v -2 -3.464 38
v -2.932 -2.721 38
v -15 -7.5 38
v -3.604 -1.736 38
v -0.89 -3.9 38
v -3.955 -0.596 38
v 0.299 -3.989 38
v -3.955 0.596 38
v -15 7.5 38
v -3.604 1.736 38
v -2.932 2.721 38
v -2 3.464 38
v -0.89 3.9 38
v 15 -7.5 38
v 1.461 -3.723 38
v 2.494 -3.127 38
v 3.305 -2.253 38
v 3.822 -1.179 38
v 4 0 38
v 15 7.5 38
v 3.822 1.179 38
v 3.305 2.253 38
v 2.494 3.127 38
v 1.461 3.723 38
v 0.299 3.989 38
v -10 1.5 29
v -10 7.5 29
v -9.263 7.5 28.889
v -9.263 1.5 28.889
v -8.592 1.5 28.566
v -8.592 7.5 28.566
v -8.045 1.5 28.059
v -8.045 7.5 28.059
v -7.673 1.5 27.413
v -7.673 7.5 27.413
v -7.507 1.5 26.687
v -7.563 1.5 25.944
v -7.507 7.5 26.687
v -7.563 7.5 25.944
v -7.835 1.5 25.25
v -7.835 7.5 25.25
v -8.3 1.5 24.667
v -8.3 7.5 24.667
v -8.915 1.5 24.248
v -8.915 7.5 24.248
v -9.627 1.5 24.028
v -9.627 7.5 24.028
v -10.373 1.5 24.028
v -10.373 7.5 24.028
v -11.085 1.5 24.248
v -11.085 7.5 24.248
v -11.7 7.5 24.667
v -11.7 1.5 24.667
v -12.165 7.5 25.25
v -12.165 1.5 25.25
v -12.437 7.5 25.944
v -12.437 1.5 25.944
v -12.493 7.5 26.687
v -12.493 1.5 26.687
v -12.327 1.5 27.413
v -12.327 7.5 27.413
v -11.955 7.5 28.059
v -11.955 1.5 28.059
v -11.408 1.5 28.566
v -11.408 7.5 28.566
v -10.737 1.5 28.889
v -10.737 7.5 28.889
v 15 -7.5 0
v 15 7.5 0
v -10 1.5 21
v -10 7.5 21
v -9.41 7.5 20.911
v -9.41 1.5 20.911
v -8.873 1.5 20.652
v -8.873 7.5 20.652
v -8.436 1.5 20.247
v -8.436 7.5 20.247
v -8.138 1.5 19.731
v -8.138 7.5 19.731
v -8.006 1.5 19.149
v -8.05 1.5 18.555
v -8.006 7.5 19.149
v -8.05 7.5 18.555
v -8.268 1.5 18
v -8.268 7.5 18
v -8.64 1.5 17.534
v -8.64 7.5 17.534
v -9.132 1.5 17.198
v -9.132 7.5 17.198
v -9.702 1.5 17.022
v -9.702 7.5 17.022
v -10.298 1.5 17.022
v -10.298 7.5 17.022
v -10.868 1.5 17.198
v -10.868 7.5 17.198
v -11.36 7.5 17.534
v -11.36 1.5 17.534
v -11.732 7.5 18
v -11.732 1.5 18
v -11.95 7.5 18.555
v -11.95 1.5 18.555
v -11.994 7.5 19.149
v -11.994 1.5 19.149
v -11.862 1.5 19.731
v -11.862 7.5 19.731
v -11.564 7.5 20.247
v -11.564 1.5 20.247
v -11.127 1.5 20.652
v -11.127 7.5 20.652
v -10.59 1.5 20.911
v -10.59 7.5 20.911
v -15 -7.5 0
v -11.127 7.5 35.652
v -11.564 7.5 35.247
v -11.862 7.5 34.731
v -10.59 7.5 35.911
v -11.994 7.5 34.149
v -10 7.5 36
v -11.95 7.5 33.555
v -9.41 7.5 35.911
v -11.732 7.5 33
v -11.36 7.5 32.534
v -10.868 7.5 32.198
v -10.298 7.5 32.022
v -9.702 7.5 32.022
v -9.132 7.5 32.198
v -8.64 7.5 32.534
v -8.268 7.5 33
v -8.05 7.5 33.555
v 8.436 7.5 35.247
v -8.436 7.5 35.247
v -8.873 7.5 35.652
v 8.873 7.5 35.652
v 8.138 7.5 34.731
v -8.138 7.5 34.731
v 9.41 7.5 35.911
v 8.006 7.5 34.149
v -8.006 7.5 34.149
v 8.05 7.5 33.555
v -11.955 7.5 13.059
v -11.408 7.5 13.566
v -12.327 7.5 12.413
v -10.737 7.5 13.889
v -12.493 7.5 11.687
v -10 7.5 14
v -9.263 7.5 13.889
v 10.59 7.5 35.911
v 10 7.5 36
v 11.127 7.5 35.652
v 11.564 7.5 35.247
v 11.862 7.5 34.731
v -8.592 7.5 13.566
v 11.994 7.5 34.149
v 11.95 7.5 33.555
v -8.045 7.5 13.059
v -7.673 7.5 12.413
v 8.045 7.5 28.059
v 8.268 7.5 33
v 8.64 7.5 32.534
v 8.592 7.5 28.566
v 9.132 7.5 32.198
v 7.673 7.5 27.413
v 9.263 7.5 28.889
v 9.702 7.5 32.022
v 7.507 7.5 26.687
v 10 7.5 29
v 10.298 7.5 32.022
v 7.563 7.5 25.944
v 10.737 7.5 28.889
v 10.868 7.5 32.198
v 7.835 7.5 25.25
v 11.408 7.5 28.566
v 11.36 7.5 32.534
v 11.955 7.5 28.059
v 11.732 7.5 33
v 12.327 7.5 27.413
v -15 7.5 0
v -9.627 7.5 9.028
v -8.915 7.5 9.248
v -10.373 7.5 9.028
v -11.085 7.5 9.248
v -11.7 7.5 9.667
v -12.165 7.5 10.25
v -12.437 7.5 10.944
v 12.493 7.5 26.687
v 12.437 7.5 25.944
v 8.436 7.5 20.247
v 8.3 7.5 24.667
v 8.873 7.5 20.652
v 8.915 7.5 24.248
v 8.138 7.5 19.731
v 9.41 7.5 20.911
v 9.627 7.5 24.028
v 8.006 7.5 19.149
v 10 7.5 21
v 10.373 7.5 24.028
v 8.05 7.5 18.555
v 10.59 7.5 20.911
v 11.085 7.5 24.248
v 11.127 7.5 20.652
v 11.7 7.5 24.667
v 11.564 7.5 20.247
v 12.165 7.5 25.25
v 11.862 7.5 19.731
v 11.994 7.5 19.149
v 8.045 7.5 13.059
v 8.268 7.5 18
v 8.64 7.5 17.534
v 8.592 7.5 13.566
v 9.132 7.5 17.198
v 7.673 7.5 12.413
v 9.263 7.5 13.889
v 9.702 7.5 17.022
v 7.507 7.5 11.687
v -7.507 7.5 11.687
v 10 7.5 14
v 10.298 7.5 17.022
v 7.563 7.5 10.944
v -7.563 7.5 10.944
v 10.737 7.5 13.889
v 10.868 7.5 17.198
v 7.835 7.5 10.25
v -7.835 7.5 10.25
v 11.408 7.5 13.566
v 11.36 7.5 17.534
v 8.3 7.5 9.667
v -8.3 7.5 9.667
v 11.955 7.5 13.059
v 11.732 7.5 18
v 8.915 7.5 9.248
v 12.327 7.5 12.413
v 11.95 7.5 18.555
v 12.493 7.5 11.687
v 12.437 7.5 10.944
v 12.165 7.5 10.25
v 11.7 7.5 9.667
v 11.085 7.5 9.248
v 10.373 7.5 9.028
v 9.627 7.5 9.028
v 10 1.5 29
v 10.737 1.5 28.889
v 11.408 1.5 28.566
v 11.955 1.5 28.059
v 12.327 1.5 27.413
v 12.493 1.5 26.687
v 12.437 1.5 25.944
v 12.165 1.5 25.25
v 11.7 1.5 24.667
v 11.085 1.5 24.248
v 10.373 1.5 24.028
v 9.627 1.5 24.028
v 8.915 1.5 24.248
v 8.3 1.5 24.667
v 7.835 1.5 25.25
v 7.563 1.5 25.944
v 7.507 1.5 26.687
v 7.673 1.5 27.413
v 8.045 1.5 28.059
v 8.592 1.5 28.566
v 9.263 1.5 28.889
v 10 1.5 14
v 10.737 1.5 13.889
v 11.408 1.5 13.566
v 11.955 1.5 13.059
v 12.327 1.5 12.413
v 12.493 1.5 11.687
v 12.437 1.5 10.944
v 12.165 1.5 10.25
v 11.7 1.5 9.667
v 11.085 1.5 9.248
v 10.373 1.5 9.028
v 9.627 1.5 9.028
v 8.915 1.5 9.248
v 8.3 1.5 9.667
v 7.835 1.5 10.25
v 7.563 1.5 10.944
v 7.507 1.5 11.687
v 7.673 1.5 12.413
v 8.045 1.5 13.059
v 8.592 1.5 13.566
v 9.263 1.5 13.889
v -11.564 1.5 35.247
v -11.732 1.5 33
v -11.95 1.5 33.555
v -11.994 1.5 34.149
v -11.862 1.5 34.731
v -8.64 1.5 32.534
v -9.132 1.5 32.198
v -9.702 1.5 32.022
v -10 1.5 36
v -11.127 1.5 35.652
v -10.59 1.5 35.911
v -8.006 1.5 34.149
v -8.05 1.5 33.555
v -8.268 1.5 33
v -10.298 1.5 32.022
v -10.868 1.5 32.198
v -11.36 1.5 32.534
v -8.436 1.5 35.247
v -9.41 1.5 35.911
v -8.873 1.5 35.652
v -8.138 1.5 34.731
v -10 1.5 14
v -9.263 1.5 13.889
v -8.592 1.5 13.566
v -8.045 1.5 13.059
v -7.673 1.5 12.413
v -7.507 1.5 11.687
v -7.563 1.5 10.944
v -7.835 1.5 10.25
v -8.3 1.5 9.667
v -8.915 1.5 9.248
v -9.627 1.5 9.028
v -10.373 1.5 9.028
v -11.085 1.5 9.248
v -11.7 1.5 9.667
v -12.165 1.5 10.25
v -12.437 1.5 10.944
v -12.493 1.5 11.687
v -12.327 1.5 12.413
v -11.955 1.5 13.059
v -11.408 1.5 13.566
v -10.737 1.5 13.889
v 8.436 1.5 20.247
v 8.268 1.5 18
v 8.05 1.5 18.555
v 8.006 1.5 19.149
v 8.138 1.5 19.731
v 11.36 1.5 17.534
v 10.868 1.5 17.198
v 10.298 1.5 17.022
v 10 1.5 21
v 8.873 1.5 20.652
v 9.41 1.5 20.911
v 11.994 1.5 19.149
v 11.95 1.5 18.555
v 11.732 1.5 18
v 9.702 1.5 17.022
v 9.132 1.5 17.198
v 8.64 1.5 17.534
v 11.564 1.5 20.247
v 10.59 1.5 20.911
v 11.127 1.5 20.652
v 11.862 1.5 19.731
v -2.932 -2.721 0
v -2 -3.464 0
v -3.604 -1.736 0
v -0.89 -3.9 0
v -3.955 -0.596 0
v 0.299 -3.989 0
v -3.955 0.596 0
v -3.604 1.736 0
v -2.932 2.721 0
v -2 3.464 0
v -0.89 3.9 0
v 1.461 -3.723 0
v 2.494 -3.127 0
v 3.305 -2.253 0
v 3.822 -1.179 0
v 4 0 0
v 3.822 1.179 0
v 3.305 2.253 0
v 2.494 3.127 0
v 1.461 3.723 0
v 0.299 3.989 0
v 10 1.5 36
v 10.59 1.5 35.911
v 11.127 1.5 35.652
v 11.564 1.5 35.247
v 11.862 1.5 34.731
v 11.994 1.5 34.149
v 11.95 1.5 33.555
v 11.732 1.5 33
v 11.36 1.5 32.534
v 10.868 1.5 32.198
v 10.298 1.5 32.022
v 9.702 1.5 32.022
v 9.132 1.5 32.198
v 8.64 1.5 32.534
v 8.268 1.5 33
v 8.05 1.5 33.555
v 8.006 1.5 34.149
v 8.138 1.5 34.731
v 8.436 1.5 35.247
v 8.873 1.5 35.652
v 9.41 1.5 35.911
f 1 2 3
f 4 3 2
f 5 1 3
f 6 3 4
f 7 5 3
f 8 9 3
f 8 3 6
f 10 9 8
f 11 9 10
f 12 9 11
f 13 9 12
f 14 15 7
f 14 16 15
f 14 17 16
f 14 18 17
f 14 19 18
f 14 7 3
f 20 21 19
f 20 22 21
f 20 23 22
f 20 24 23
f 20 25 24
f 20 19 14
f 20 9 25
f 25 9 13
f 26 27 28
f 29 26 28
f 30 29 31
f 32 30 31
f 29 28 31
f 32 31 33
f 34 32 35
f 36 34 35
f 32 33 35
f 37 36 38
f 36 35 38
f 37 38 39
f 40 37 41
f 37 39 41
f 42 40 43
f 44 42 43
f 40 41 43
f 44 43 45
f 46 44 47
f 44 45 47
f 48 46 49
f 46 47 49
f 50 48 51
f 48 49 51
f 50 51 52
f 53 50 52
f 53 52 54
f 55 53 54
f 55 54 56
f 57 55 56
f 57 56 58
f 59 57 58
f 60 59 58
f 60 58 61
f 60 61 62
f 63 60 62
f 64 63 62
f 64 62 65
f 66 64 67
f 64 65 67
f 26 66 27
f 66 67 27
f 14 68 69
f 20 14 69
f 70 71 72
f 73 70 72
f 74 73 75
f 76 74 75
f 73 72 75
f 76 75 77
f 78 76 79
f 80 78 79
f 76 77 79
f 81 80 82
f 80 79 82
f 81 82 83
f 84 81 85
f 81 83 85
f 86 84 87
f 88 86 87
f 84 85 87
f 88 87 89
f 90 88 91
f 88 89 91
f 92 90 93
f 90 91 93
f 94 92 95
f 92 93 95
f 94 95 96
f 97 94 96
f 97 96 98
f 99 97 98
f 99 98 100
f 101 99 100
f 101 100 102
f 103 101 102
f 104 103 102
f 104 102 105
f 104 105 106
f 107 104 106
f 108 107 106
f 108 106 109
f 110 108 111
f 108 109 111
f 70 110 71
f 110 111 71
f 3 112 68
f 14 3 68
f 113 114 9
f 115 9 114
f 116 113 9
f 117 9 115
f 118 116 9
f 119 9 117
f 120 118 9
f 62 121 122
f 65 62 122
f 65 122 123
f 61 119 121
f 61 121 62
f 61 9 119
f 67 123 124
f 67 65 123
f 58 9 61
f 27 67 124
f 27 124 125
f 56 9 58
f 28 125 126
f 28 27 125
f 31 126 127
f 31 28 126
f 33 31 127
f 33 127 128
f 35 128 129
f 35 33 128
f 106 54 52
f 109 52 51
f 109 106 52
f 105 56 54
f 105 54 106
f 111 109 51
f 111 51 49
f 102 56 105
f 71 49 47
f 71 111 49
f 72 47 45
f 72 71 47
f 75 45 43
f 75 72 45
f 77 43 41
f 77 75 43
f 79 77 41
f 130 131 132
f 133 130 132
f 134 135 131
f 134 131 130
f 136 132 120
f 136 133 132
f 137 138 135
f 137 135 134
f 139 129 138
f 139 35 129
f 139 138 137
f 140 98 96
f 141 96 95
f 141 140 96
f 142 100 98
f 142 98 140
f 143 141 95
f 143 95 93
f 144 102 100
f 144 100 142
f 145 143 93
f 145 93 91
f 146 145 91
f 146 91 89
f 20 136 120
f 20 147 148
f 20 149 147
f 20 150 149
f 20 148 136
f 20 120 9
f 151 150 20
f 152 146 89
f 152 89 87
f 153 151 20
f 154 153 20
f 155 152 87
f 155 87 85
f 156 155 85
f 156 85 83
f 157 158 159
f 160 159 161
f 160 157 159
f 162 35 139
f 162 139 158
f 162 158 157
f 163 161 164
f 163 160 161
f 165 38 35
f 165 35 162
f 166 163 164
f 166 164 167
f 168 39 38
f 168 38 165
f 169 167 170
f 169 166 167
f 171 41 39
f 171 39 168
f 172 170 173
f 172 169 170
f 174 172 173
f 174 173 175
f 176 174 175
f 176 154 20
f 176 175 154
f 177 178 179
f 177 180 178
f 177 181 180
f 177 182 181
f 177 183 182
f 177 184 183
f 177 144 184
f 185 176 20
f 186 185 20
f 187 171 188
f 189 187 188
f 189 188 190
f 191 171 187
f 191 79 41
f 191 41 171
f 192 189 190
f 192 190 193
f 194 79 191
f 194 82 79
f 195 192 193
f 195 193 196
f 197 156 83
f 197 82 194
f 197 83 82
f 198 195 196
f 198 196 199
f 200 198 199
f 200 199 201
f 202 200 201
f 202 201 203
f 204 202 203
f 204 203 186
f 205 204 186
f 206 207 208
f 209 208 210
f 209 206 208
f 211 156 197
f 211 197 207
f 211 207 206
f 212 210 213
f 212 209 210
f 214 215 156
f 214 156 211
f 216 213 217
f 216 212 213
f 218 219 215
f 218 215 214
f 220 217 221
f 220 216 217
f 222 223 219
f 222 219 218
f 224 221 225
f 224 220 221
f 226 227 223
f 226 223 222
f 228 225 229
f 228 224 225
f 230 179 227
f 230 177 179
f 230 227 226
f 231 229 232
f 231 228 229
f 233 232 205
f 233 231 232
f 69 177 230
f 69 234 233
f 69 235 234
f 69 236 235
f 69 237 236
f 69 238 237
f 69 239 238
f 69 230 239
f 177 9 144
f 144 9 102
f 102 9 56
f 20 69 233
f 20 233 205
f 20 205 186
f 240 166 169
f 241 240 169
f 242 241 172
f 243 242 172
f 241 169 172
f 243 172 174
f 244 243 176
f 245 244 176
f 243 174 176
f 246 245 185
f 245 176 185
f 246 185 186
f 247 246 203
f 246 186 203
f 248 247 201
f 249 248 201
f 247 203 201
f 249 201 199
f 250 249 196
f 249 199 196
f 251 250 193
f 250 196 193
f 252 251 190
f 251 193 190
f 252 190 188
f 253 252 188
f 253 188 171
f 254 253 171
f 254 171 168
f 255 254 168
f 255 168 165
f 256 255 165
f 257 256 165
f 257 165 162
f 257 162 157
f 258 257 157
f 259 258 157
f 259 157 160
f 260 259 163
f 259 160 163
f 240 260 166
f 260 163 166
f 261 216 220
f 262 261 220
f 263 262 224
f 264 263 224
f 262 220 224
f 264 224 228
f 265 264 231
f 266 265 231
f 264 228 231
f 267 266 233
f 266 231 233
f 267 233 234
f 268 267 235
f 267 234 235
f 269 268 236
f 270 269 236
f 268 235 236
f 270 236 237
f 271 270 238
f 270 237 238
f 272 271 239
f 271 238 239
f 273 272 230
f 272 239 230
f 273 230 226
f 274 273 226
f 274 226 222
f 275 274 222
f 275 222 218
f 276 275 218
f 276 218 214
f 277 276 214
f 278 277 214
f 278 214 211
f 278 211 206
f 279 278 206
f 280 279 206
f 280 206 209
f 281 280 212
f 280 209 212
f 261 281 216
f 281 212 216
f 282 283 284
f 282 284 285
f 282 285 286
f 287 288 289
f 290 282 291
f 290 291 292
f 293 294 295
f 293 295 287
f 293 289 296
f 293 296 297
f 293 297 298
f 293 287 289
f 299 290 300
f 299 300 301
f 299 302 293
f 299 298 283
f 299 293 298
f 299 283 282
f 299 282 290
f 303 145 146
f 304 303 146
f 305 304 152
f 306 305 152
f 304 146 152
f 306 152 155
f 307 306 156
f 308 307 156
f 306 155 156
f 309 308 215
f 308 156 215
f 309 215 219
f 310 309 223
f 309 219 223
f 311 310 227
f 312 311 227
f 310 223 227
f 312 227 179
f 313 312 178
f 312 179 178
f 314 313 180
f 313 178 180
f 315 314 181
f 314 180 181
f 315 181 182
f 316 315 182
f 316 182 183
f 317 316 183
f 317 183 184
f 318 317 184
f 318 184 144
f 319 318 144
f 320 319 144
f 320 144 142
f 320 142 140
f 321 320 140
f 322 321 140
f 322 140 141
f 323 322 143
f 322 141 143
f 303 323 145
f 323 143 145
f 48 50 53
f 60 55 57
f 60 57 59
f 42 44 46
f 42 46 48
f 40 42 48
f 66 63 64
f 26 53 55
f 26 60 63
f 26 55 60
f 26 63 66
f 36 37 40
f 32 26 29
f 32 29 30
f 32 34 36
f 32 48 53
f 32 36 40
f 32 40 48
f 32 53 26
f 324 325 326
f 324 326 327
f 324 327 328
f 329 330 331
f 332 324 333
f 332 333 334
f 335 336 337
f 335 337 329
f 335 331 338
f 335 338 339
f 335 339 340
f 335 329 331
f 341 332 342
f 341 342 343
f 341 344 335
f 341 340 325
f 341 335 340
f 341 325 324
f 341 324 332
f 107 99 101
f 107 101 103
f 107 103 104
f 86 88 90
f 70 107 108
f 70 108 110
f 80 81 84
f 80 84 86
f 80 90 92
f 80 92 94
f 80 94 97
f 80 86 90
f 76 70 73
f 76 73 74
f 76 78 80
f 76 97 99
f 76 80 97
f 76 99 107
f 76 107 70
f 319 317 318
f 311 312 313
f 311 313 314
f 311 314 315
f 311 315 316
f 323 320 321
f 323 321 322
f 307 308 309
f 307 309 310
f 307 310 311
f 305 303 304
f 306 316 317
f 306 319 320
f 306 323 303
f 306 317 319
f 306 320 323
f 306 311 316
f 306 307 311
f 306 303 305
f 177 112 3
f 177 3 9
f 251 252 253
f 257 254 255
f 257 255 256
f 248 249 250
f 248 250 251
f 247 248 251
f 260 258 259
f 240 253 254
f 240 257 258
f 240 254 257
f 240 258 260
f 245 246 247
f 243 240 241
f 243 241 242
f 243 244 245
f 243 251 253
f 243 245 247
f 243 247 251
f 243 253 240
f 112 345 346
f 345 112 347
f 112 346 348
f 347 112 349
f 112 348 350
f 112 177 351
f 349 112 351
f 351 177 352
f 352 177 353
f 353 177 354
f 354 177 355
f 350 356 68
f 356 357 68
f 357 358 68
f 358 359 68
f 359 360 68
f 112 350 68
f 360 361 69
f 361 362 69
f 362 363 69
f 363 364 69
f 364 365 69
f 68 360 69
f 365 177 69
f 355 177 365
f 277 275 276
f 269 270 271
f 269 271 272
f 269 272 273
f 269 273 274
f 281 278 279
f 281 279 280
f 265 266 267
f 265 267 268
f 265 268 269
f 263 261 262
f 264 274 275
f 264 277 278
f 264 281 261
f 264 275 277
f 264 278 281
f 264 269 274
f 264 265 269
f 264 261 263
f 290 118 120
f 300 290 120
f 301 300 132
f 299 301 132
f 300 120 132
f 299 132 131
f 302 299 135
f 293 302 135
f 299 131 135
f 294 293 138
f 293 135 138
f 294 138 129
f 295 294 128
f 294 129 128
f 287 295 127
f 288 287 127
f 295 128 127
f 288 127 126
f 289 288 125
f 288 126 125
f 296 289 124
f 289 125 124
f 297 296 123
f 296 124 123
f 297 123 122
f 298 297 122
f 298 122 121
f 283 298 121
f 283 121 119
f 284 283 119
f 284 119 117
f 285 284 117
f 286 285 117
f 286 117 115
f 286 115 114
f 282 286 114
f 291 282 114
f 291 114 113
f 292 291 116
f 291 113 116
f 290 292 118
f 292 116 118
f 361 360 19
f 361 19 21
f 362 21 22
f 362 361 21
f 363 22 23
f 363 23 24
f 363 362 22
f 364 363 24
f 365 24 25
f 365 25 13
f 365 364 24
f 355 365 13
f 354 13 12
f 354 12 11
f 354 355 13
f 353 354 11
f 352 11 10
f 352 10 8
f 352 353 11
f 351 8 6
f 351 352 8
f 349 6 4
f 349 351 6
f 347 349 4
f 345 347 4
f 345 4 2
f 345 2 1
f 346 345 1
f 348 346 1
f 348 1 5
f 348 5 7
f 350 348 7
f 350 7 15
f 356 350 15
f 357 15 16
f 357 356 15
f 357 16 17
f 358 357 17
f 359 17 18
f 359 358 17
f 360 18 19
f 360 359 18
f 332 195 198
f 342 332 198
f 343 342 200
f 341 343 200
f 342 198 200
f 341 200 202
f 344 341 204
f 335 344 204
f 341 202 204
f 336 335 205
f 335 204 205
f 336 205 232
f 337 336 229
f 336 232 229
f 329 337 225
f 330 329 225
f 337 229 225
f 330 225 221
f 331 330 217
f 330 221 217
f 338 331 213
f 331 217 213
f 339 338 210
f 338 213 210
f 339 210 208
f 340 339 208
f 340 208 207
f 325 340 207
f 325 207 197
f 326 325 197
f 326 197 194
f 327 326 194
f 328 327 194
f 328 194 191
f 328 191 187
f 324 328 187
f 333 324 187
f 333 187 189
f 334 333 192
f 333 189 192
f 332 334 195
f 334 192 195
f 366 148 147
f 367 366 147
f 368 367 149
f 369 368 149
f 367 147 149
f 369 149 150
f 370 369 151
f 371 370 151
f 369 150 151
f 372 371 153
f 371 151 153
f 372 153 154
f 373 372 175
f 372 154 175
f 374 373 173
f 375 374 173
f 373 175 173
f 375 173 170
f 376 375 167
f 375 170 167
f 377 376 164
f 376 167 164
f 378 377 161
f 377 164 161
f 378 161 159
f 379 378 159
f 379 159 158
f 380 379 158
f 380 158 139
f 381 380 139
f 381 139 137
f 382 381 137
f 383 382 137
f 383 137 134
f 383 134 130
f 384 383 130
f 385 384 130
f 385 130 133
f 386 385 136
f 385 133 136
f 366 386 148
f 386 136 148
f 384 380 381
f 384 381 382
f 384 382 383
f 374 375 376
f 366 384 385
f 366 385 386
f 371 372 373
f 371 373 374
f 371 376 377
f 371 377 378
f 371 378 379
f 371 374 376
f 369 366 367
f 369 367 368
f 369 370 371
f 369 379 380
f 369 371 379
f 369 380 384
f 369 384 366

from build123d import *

# Parameters (mm, degrees)
SKETCH_1_W          = 30
SKETCH_1_H          = 15
SKETCH_1_R          = 4
EXTRUDE_1_DEPTH     = 38
SKETCH_2_R          = 2
SKETCH_2_R_2        = 2.5
CUT_EXTRUDE_1_DEPTH = 6


with BuildPart() as part:
    # 草图1 → 凸台-拉伸1 (new body)
    with BuildSketch(Plane.XY):
        Rectangle(SKETCH_1_W, SKETCH_1_H)
        Circle(SKETCH_1_R, mode=Mode.SUBTRACT)
    extrude(amount=EXTRUDE_1_DEPTH)

    # 草图2 → 切除-拉伸1 (cut)
    with BuildSketch(Plane(origin=(0, 7.5, 0), x_dir=(1, 0, 0), z_dir=(0, 1, 0))):
        with Locations(Location((10, -19, 0), (0, 0, 270))):
            Circle(SKETCH_2_R)
        with Locations(Location((-10, -19, 0), (0, 0, 270))):
            Circle(SKETCH_2_R)
        with Locations(Location((10, -26.5, 0), (0, 0, 270))):
            Circle(SKETCH_2_R_2)
        with Locations(Location((-10, -26.5, 0), (0, 0, 270))):
            Circle(SKETCH_2_R_2)
        with Locations(Location((-10, -34, 0), (0, 0, 270))):
            Circle(SKETCH_2_R)
        with Locations(Location((10, -34, 0), (0, 0, 270))):
            Circle(SKETCH_2_R)
        with Locations(Location((10, -11.5, 0), (0, 0, 270))):
            Circle(SKETCH_2_R_2)
        with Locations(Location((-10, -11.5, 0), (0, 0, 270))):
            Circle(SKETCH_2_R_2)
    extrude(amount=-CUT_EXTRUDE_1_DEPTH, mode=Mode.SUBTRACT)


solid = part.part
